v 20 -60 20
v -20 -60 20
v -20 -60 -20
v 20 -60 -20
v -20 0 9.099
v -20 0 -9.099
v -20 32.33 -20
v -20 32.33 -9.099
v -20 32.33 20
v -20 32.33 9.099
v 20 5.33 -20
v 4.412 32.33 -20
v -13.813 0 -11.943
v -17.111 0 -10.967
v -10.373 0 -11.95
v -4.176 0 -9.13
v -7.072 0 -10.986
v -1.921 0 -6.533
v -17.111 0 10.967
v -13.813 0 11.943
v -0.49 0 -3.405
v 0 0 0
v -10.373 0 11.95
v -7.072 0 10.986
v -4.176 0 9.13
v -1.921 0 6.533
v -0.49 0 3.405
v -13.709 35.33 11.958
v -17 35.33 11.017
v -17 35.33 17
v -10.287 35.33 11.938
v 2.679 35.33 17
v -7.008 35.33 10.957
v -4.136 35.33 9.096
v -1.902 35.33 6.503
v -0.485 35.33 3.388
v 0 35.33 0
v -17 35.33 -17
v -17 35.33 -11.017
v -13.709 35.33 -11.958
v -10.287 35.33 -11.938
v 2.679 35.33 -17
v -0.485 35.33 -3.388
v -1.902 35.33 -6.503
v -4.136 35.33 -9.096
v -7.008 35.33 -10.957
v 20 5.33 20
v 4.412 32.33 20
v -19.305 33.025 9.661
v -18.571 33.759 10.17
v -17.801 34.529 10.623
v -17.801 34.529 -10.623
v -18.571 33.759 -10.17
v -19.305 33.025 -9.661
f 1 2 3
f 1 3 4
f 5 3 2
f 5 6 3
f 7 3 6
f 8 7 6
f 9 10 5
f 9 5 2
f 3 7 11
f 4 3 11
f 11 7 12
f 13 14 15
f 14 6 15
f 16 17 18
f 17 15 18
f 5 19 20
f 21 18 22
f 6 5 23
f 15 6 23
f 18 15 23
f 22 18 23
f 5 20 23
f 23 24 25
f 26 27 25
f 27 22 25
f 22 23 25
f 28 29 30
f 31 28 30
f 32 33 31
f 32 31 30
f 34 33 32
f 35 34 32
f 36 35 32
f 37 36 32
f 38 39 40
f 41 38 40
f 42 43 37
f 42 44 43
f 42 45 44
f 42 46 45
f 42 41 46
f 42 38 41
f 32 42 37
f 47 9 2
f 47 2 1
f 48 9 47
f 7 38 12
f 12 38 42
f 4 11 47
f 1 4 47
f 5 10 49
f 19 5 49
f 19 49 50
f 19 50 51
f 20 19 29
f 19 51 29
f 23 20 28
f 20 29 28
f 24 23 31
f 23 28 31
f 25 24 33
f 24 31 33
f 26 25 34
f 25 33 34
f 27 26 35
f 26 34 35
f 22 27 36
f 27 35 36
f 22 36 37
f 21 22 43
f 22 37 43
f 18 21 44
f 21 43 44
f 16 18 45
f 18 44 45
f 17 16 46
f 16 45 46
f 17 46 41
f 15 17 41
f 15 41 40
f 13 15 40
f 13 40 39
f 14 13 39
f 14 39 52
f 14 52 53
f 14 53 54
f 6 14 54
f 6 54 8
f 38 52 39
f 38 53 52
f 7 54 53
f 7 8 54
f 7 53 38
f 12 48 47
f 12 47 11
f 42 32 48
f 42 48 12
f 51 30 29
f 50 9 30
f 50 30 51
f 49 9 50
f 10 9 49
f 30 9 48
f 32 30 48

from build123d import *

# Parameters (mm, degrees)
SKETCH1_W           = 40
SKETCH1_H           = 40
BOSS_EXTRUDE1_DEPTH = 35.33
SKETCH2_R           = 12.07
CUT_EXTRUDE1_DEPTH  = 42
SKETCH3_W           = 40
SKETCH3_H           = 40
BOSS_EXTRUDE2_DEPTH = 60
CHAMFER1_SIZE       = 30
CHAMFER1_SIZE2      = 17.320508076
CHAMFER2_SIZE       = 3


with BuildPart() as part:
    # Sketch1 → Boss-Extrude1 (new body)
    with BuildSketch(Plane(origin=(0, 0, 0), x_dir=(1, 0, 0), z_dir=(0, 1, 0))):
        Rectangle(SKETCH1_W, SKETCH1_H)
    extrude(amount=BOSS_EXTRUDE1_DEPTH)

    # Sketch2 → Cut-Extrude1 (cut)
    with BuildSketch(Plane(origin=(0, 35.33, 0), x_dir=(1, 0, 0), z_dir=(0, 1, 0))):
        with Locations((-12.07, 0)):
            Circle(SKETCH2_R)
    extrude(amount=-CUT_EXTRUDE1_DEPTH, mode=Mode.SUBTRACT)

    # Sketch3 → Boss-Extrude2 (add)
    with BuildSketch(Plane.XZ):
        Rectangle(SKETCH3_W, SKETCH3_H)
    extrude(amount=BOSS_EXTRUDE2_DEPTH)

    # Chamfer1
    chamfer1_edges = [part.edges().sort_by_distance(p)[0] for p in [
        (20, 35.33, 0),
    ]]
    chamfer1_side = [part.faces().sort_by_distance(p)[0] for p in [
        (20, -12.335, 0),
    ]]
    chamfer(chamfer1_edges, length=CHAMFER1_SIZE, length2=CHAMFER1_SIZE2, reference=chamfer1_side[0])

    # Chamfer2
    chamfer2_edges = [part.edges().sort_by_distance(p)[0] for p in [
        (-20, 35.33, -14.549725266),
        (-20, 35.33, 14.549725266),
        (-8.660254038, 35.33, 20),
        (-8.660254038, 35.33, -20),
    ]]
    chamfer(chamfer2_edges, length=CHAMFER2_SIZE)


solid = part.part
